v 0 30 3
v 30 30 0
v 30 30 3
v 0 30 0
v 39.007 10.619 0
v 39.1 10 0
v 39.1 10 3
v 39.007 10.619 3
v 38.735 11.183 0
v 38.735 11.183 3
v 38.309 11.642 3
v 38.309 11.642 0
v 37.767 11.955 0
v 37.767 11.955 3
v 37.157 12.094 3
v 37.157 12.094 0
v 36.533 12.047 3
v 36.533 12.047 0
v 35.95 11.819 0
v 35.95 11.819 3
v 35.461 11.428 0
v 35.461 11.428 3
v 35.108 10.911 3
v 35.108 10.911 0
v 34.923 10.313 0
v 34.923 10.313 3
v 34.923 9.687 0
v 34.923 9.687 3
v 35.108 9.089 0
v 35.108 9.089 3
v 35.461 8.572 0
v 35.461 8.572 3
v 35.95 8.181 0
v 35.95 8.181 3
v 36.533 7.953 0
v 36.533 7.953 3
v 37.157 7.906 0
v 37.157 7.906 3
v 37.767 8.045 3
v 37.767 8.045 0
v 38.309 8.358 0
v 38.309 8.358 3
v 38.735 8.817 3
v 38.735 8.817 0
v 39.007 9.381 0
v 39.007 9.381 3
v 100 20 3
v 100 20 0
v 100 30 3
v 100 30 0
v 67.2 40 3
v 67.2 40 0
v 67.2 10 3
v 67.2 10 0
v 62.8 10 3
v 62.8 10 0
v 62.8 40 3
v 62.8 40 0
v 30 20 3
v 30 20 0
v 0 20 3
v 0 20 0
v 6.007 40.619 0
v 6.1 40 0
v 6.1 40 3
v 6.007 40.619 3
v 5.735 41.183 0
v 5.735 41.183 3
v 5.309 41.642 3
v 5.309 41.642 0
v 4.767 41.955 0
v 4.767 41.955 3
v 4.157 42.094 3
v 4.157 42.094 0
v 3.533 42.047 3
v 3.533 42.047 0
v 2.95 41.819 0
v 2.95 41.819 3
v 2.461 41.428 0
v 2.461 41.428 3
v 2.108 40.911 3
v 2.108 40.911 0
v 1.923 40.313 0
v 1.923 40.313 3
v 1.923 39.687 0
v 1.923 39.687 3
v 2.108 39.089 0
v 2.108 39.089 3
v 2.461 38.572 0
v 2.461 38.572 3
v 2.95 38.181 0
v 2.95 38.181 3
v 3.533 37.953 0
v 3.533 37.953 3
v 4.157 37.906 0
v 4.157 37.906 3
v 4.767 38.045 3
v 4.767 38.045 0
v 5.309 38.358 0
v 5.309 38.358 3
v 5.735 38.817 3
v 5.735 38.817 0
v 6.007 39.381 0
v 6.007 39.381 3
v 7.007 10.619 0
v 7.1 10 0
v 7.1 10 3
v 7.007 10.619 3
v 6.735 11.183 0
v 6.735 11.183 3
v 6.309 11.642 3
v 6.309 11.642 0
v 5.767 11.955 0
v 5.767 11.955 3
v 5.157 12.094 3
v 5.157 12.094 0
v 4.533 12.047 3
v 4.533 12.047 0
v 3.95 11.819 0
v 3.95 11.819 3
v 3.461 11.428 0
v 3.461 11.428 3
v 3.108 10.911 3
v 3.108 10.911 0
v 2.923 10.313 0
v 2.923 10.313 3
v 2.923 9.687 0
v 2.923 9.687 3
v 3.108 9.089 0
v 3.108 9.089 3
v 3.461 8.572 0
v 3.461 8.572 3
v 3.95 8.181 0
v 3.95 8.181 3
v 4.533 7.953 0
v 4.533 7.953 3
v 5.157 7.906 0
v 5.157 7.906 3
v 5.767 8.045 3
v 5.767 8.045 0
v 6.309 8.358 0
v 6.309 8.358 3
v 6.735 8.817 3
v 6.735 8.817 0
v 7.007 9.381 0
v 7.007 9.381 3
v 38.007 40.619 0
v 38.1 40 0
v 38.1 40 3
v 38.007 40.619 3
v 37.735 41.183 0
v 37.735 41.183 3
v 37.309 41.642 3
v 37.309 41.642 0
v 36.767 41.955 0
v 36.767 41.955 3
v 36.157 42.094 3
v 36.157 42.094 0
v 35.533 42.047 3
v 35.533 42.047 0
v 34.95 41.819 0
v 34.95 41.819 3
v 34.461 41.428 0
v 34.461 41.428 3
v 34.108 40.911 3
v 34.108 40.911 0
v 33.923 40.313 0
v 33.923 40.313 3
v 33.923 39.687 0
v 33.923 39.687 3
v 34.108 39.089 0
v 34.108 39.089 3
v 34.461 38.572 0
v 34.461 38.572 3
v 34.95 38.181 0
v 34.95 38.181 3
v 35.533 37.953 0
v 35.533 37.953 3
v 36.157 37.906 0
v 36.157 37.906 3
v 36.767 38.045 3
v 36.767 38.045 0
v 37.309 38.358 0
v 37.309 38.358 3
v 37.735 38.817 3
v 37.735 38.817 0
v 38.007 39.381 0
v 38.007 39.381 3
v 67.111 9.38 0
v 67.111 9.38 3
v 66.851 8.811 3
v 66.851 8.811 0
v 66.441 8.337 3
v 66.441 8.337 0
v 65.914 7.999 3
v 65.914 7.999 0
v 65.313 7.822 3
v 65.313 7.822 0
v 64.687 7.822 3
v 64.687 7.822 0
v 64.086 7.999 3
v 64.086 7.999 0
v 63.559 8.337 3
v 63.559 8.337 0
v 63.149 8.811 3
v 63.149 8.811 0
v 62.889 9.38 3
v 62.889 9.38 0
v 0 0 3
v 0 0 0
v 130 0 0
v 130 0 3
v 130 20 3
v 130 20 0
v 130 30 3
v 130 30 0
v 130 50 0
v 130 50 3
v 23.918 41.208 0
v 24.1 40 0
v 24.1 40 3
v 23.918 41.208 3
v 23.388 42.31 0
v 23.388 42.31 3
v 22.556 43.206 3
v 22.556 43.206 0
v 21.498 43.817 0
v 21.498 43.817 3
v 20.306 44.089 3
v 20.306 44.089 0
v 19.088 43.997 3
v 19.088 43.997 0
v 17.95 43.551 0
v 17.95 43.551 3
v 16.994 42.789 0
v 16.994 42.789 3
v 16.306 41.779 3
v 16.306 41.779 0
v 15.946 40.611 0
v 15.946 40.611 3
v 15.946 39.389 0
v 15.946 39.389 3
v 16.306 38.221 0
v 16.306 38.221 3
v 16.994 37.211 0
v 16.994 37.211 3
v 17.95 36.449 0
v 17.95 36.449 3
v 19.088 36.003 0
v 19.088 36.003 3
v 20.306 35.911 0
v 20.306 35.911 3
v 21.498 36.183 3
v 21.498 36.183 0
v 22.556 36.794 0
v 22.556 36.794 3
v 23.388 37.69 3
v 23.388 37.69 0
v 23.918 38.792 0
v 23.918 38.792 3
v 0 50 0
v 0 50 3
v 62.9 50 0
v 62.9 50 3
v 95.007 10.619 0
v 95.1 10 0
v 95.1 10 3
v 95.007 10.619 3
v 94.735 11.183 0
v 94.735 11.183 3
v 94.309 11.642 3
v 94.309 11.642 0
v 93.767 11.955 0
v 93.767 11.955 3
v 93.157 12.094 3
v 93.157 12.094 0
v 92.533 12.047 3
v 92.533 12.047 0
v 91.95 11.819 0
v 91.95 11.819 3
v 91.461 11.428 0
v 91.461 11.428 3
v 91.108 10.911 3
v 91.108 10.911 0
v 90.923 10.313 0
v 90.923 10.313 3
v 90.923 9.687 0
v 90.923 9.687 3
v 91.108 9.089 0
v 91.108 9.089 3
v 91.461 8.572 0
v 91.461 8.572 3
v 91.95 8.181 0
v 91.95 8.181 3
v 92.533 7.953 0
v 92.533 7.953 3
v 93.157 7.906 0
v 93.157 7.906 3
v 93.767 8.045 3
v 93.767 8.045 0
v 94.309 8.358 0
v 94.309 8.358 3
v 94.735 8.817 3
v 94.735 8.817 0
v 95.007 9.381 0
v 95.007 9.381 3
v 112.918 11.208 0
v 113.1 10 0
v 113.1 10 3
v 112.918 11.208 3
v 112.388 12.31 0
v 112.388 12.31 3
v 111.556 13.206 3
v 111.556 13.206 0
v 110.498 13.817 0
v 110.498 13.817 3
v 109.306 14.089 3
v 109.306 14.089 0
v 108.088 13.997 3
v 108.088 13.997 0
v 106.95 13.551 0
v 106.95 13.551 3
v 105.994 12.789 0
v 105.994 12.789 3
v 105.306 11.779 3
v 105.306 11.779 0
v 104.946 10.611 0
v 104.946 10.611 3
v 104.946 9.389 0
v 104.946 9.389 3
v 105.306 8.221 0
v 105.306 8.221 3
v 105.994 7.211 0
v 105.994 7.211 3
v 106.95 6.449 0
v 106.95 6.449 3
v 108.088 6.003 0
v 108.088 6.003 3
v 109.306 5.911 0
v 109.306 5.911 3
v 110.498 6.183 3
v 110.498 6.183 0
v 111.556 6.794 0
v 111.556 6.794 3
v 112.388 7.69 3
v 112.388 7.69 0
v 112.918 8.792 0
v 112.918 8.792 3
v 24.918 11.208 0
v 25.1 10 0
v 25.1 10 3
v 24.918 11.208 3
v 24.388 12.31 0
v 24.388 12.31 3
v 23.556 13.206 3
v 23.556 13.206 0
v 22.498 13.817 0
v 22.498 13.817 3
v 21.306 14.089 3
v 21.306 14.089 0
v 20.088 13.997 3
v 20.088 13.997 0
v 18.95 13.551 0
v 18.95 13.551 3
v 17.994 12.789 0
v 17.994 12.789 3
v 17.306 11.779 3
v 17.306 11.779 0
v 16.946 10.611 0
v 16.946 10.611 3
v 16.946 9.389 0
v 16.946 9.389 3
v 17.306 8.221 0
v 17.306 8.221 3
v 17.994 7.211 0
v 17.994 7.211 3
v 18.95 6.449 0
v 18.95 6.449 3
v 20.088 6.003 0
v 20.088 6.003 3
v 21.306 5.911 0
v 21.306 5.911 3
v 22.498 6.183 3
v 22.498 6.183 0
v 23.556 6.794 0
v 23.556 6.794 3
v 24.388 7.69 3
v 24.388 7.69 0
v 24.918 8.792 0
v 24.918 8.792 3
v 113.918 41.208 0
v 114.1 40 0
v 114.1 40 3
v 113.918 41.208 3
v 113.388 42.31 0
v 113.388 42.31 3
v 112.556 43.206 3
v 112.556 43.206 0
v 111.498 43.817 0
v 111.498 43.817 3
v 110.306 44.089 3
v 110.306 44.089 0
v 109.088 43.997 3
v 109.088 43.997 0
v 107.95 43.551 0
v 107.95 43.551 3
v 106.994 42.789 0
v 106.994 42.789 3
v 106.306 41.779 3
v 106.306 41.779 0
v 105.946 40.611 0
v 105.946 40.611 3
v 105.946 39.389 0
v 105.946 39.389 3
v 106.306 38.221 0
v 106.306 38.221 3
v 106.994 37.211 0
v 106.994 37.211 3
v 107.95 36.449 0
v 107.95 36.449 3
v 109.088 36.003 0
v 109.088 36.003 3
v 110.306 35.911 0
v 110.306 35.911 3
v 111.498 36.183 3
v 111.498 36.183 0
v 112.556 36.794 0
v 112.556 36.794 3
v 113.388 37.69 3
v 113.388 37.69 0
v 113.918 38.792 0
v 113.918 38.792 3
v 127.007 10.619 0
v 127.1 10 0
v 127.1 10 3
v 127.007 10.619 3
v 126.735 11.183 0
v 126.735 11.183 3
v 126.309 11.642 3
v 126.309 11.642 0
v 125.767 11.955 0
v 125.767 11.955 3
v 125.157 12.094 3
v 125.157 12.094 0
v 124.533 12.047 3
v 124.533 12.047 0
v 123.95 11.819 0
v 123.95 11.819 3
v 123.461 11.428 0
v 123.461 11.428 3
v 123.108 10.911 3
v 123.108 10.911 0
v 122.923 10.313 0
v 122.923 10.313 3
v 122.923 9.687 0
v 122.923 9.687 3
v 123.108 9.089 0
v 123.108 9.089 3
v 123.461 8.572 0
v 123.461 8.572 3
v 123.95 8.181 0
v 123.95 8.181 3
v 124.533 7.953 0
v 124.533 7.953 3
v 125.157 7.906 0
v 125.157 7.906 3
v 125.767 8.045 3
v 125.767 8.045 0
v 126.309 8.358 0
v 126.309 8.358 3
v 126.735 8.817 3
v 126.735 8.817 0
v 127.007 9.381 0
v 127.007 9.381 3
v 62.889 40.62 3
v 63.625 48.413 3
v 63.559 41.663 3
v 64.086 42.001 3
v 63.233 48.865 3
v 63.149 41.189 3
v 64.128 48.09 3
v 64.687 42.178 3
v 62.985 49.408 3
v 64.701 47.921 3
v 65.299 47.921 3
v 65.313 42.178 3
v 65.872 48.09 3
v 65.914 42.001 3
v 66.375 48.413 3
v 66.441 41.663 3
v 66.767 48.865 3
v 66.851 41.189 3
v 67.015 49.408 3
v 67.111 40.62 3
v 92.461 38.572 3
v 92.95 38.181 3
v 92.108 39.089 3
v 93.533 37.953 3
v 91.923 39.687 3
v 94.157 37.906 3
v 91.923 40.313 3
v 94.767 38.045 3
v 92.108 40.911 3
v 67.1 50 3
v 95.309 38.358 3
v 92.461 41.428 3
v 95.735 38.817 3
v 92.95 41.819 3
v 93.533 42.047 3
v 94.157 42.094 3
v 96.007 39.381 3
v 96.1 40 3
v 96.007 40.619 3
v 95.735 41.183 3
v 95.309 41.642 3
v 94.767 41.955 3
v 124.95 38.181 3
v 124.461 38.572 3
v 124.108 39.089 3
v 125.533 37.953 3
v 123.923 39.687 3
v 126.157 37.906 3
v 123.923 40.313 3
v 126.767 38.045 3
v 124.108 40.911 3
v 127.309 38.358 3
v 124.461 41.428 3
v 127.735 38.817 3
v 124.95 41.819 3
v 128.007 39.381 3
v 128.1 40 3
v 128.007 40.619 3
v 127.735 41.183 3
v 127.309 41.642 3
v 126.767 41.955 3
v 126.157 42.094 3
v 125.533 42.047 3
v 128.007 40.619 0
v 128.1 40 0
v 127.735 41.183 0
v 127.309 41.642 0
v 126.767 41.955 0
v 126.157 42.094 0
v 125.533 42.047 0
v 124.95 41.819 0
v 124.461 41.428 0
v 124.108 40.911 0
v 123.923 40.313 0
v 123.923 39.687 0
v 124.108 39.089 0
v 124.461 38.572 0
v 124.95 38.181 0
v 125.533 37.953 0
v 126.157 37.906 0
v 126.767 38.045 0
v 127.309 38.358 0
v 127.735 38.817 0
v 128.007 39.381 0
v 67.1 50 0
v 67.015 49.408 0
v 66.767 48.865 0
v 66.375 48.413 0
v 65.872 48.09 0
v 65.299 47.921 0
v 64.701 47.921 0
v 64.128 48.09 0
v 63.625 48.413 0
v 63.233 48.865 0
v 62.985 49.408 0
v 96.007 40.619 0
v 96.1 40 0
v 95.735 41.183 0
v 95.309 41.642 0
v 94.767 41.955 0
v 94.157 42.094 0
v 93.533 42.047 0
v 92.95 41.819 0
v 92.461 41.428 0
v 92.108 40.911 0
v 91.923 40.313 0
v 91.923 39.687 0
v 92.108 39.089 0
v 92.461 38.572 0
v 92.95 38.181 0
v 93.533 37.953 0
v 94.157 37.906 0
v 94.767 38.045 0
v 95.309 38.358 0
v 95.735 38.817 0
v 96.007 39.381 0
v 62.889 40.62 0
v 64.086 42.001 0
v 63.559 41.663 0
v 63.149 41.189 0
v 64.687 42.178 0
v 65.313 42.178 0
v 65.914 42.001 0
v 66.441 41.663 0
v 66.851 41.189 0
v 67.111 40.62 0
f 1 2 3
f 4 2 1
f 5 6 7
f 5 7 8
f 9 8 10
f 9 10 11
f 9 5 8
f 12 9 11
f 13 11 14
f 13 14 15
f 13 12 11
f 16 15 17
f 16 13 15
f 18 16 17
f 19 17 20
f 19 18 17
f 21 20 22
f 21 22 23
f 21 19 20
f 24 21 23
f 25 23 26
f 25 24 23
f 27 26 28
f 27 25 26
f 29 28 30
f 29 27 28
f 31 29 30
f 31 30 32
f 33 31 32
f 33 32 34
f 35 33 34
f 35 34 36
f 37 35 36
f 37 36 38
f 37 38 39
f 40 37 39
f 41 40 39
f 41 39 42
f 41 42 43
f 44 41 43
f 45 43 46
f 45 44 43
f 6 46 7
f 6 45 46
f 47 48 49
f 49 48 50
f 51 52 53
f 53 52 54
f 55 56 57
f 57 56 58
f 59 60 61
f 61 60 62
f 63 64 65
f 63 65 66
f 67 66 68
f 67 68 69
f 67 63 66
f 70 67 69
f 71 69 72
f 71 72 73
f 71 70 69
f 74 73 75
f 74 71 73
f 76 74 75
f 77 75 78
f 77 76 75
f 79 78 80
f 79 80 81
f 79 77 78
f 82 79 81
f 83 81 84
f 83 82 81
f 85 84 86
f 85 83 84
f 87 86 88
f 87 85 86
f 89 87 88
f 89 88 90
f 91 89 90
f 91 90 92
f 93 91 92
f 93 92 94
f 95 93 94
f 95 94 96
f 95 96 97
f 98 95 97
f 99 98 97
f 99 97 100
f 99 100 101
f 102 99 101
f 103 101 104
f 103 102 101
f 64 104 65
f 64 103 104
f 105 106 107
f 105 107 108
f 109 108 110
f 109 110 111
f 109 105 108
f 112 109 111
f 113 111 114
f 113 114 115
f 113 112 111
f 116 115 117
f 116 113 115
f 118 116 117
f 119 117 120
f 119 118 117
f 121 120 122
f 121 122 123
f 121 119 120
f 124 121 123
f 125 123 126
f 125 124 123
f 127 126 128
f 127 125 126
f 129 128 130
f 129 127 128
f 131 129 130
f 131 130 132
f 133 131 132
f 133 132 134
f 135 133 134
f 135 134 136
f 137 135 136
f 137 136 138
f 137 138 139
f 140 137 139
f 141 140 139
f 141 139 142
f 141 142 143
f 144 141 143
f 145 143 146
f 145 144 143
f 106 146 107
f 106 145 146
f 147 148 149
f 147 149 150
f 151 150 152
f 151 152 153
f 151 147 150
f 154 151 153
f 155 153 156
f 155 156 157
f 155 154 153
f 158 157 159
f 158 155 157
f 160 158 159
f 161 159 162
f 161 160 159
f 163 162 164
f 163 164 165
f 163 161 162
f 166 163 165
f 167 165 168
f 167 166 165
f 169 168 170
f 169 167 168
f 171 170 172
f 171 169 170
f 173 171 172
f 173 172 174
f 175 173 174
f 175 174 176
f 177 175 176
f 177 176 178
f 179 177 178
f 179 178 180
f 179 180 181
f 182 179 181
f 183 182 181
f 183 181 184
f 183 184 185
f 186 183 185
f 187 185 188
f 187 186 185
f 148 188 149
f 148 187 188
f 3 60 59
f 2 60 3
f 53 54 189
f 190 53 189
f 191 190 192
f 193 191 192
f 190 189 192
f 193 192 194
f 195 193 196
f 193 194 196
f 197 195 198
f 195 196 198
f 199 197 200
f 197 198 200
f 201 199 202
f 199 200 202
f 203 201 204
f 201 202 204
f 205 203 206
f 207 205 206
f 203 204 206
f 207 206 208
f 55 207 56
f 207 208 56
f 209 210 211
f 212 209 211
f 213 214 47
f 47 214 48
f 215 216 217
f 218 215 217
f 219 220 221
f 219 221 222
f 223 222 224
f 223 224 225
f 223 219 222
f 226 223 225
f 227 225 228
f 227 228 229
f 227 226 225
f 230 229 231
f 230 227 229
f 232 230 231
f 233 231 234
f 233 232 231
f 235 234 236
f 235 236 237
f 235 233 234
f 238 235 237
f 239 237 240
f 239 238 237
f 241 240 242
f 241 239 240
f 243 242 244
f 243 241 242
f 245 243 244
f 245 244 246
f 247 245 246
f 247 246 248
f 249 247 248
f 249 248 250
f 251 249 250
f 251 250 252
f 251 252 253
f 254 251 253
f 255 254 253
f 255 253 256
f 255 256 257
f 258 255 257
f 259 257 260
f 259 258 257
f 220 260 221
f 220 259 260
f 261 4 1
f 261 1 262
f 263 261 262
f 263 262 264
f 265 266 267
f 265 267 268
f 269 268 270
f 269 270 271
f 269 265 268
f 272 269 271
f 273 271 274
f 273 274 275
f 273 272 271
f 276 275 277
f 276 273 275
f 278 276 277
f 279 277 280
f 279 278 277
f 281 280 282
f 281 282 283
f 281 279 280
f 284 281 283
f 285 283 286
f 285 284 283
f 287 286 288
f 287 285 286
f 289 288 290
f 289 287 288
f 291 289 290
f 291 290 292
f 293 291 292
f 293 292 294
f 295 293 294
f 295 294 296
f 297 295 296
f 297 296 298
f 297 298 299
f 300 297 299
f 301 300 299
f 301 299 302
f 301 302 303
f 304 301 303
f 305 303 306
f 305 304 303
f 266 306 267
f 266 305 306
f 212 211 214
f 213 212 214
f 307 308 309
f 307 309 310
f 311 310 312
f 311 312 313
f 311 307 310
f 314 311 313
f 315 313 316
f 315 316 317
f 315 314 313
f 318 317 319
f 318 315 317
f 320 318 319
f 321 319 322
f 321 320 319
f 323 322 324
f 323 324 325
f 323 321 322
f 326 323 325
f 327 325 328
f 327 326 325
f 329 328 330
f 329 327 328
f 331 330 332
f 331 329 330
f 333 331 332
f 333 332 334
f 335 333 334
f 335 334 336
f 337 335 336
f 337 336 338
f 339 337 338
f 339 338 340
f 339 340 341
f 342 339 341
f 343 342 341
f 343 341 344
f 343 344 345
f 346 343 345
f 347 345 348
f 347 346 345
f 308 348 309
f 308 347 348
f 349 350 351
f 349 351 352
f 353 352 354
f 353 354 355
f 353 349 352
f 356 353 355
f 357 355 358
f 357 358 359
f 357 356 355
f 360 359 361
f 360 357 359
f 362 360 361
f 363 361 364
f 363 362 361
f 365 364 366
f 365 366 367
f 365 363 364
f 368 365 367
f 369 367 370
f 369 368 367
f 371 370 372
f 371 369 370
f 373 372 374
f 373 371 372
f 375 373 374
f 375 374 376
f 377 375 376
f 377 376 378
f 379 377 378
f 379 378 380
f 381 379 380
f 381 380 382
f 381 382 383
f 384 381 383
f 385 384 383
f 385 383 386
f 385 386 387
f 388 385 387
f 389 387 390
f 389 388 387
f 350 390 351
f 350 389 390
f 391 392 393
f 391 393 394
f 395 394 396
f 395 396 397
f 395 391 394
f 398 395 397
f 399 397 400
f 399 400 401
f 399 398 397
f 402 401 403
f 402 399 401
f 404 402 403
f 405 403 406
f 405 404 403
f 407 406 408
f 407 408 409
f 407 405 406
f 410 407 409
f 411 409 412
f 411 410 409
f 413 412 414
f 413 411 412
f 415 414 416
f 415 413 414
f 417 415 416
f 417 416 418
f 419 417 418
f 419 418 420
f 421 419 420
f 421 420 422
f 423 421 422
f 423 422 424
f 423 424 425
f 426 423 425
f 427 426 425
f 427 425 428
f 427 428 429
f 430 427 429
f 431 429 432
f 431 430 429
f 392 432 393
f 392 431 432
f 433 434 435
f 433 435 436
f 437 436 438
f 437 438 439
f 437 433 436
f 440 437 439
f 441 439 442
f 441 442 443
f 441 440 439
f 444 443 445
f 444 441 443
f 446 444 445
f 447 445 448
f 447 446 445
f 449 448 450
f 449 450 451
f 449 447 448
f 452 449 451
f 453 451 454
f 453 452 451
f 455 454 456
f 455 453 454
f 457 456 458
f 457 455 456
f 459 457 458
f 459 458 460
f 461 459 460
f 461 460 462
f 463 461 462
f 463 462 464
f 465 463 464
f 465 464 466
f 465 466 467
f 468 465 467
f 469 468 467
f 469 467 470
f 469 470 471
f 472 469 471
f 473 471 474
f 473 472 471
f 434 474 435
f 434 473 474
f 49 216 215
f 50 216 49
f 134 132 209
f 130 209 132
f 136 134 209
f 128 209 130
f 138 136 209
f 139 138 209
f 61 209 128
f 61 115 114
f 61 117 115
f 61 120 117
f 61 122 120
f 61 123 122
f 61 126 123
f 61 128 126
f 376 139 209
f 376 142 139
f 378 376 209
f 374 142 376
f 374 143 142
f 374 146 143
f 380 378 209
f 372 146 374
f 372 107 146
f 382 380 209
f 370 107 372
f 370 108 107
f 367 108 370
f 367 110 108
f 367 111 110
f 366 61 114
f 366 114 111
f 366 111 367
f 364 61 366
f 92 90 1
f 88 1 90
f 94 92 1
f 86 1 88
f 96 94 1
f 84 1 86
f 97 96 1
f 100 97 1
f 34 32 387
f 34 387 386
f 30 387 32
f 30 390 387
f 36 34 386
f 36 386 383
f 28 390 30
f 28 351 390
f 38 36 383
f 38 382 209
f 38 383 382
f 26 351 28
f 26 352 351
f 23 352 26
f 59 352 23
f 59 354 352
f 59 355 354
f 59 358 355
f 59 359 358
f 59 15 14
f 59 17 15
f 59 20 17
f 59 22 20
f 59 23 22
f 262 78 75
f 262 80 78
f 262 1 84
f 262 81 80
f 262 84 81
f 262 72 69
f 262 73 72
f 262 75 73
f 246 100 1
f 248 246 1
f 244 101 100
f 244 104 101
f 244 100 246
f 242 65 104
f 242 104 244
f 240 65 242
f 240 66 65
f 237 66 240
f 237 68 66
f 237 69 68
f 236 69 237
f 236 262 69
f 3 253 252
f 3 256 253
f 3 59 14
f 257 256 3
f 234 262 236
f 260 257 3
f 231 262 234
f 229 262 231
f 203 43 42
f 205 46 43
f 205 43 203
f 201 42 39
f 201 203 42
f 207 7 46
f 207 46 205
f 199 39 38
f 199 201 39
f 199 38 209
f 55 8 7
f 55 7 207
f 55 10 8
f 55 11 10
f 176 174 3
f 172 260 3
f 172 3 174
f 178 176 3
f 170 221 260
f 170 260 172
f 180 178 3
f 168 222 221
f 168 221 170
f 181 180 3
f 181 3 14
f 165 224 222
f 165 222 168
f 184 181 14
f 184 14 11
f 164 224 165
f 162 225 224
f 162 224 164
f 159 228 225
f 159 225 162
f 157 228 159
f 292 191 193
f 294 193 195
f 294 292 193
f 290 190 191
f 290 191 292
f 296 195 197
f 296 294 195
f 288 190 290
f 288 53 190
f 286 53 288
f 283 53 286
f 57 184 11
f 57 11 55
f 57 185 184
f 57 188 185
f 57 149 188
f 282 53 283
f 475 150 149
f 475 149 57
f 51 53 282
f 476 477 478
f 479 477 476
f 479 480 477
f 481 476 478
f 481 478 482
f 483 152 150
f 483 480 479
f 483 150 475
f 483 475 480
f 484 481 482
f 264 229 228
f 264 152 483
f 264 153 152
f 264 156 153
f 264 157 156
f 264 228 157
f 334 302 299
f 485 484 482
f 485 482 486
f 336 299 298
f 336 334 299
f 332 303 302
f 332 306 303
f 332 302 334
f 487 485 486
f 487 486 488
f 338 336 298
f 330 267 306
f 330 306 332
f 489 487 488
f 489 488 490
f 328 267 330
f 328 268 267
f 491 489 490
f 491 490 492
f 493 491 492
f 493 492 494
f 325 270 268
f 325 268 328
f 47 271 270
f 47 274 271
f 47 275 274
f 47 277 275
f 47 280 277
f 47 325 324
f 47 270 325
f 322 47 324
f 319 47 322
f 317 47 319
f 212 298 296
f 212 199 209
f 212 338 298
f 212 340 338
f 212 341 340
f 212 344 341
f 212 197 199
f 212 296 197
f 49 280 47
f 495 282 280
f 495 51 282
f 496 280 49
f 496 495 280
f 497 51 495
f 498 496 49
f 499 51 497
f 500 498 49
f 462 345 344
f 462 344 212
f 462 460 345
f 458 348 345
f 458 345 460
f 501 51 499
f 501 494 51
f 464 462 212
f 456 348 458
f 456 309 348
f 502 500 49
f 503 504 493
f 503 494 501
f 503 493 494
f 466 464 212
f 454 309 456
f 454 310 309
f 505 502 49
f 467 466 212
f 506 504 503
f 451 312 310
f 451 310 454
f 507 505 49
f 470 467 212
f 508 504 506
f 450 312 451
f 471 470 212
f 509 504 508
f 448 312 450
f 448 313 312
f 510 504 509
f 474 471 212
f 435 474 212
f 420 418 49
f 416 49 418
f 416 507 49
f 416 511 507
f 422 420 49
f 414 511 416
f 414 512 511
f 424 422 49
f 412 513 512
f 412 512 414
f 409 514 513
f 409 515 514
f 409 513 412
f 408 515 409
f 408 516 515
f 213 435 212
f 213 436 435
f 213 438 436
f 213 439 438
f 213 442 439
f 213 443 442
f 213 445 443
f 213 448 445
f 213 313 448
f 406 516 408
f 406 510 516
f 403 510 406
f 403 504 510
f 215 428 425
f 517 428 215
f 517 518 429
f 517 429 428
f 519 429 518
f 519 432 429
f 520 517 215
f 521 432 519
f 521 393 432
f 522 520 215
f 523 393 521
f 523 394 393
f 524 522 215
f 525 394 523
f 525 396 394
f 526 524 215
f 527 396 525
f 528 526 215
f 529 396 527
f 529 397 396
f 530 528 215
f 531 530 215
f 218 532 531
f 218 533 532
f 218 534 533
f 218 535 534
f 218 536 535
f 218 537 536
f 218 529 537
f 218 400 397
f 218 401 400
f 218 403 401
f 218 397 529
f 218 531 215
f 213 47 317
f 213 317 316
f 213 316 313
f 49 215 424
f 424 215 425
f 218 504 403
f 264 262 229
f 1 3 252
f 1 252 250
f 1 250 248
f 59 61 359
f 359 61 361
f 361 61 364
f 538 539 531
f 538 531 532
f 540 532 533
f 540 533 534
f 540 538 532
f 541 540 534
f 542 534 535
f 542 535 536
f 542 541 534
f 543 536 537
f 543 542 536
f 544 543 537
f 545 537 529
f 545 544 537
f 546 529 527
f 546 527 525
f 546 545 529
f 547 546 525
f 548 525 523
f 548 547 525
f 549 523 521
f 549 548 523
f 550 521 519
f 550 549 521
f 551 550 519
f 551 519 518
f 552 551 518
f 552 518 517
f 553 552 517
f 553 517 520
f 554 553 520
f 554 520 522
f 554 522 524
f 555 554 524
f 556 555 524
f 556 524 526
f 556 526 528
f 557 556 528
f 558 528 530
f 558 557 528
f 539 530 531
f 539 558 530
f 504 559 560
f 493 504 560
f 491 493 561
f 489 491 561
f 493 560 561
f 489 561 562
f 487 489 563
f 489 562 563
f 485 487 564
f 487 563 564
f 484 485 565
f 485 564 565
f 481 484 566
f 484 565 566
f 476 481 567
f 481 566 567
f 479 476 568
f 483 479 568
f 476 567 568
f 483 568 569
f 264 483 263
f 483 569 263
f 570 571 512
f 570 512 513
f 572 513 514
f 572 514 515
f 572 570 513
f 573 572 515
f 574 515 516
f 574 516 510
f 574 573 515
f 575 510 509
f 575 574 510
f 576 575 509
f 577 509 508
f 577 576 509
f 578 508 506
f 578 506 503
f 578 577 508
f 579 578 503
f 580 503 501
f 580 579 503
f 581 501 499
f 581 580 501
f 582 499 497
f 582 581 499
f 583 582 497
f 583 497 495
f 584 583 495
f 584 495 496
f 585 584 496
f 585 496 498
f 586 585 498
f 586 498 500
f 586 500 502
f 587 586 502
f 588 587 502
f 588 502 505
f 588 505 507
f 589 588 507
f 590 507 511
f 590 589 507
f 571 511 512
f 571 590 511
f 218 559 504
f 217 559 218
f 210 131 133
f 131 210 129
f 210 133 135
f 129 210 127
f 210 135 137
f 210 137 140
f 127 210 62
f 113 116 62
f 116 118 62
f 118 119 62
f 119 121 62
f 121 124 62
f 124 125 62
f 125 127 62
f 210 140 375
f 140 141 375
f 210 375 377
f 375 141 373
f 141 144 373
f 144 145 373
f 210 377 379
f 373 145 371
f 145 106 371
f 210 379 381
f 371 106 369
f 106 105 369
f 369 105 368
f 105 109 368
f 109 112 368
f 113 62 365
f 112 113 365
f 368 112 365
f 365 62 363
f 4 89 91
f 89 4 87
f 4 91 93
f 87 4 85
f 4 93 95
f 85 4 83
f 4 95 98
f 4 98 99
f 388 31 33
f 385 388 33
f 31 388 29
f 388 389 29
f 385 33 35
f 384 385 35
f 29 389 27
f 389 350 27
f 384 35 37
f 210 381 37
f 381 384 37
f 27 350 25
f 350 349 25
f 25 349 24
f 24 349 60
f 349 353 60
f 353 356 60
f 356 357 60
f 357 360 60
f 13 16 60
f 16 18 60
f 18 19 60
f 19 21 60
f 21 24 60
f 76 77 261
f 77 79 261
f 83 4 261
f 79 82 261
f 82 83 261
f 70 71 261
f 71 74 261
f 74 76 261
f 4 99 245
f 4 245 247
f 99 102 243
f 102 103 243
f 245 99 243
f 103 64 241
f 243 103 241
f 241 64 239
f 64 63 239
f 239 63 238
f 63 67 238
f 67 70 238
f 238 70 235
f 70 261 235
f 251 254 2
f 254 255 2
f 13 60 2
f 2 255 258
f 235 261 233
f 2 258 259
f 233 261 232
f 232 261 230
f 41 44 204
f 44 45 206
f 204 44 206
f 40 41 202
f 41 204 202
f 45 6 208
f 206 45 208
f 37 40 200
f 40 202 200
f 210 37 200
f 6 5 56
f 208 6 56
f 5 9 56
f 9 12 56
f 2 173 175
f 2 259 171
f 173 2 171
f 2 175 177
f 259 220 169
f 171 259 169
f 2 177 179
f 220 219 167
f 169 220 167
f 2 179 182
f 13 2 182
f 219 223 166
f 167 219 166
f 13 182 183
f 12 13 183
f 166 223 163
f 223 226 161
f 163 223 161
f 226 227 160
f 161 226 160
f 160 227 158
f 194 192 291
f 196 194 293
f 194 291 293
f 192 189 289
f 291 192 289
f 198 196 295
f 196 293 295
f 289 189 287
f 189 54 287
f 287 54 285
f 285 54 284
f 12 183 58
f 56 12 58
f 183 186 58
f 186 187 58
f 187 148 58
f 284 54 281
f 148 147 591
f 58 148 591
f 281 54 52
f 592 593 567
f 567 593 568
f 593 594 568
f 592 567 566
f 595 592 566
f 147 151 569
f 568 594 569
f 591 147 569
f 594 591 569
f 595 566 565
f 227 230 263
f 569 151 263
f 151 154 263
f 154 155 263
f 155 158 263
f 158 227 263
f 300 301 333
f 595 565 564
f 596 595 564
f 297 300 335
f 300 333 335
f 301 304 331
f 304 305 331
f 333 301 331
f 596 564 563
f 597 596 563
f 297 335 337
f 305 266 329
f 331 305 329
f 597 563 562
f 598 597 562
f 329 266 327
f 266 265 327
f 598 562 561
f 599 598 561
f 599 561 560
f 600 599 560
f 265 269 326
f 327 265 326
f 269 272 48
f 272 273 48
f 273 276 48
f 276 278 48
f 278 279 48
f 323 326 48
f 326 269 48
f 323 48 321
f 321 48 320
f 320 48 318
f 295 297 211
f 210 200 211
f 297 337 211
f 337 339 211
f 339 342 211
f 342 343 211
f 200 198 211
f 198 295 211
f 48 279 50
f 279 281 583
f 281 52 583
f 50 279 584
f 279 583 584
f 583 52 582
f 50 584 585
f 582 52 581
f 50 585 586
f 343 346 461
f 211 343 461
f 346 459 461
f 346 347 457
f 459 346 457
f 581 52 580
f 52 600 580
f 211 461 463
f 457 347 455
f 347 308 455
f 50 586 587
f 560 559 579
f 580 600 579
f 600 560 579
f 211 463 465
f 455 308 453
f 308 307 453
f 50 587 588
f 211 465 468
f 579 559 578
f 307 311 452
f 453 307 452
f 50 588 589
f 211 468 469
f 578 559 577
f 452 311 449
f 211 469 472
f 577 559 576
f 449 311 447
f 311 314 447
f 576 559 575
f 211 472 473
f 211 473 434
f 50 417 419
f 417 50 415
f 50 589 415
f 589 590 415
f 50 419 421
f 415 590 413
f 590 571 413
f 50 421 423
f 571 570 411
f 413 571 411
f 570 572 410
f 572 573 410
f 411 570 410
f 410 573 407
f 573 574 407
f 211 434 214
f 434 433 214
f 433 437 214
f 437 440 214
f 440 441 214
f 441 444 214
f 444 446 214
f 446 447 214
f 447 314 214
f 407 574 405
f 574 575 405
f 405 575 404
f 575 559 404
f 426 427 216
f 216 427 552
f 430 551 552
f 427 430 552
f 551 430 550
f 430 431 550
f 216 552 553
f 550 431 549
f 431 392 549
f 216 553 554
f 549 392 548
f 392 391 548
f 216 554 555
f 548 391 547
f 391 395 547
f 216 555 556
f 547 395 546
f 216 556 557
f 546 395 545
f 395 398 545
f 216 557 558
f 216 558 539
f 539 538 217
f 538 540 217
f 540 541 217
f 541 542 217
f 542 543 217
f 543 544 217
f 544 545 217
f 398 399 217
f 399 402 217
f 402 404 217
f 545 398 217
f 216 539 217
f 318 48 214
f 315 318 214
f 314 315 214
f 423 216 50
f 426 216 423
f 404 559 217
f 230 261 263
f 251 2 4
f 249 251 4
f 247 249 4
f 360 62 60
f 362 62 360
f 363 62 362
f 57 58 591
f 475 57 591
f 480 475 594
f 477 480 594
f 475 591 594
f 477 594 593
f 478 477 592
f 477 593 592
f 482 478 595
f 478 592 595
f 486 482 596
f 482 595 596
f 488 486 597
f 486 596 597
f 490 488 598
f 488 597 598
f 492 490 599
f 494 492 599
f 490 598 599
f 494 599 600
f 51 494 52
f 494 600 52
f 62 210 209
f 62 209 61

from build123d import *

# Parameters (mm, degrees)
ESQUISSE1_W             = 130
ESQUISSE1_H             = 50
ESQUISSE1_R             = 2.1
ESQUISSE1_R_2           = 4.1
BOSS_EXTRU_1_DEPTH      = 3
ENL_V_MAT_EXTRU_1_REACH = 5
ESQUISSE2_W             = 30
ESQUISSE2_H             = 10


with BuildPart() as part:
    # Esquisse1 → Boss.-Extru.1 (new body)
    with BuildSketch(Plane.XY):
        with Locations((65, 25)):
            Rectangle(ESQUISSE1_W, ESQUISSE1_H)
        with Locations((4, 40)):
            Circle(ESQUISSE1_R, mode=Mode.SUBTRACT)
        with Locations((20, 40)):
            Circle(ESQUISSE1_R_2, mode=Mode.SUBTRACT)
        with Locations((36, 40)):
            Circle(ESQUISSE1_R, mode=Mode.SUBTRACT)
        with Locations((94, 40)):
            Circle(ESQUISSE1_R, mode=Mode.SUBTRACT)
        with Locations((110, 40)):
            Circle(ESQUISSE1_R_2, mode=Mode.SUBTRACT)
        with Locations((126, 40)):
            Circle(ESQUISSE1_R, mode=Mode.SUBTRACT)
        with Locations((5, 10)):
            Circle(ESQUISSE1_R, mode=Mode.SUBTRACT)
        with Locations((21, 10)):
            Circle(ESQUISSE1_R_2, mode=Mode.SUBTRACT)
        with Locations((37, 10)):
            Circle(ESQUISSE1_R, mode=Mode.SUBTRACT)
        with Locations((93, 10)):
            Circle(ESQUISSE1_R, mode=Mode.SUBTRACT)
        with Locations((109, 10)):
            Circle(ESQUISSE1_R_2, mode=Mode.SUBTRACT)
        with Locations((125, 10)):
            Circle(ESQUISSE1_R, mode=Mode.SUBTRACT)
        with BuildLine():
            Line((62.8, 10), (62.8, 40))
            ThreePointArc((62.8, 40), (65, 42.2), (67.2, 40))
            Line((67.2, 40), (67.2, 10))
            ThreePointArc((67.2, 10), (65, 7.8), (62.8, 10))
        make_face(mode=Mode.SUBTRACT)
    extrude(amount=BOSS_EXTRU_1_DEPTH)

    # Esquisse2 → Enlèv. mat.-Extru.1 (cut, up to next)
    with BuildSketch(Plane(origin=(0, 0, 0), x_dir=(-1, 0, 0), z_dir=(0, 0, -1)), mode=Mode.PRIVATE) as enl_v_mat_extru_1_sk1:
        with Locations((-15, 25)):
            Rectangle(ESQUISSE2_W, ESQUISSE2_H)
    enl_v_mat_extru_1_tool1 = extrude(enl_v_mat_extru_1_sk1.sketch, amount=-ENL_V_MAT_EXTRU_1_REACH, mode=Mode.PRIVATE) & part.part
    add(enl_v_mat_extru_1_tool1.solids().sort_by_distance((15, 25, 0))[0], mode=Mode.SUBTRACT)
    # Esquisse2 → Enlèv. mat.-Extru.1 (cut, up to next)
    with BuildSketch(Plane(origin=(0, 0, 0), x_dir=(-1, 0, 0), z_dir=(0, 0, -1)), mode=Mode.PRIVATE) as enl_v_mat_extru_1_sk2:
        with Locations((-115, 25)):
            Rectangle(ESQUISSE2_W, ESQUISSE2_H)
    enl_v_mat_extru_1_tool2 = extrude(enl_v_mat_extru_1_sk2.sketch, amount=-ENL_V_MAT_EXTRU_1_REACH, mode=Mode.PRIVATE) & part.part
    add(enl_v_mat_extru_1_tool2.solids().sort_by_distance((115, 25, 0))[0], mode=Mode.SUBTRACT)
    # Esquisse2 → Enlèv. mat.-Extru.1 (cut, up to next)
    with BuildSketch(Plane(origin=(0, 0, 0), x_dir=(-1, 0, 0), z_dir=(0, 0, -1)), mode=Mode.PRIVATE) as enl_v_mat_extru_1_sk3:
        with BuildLine():
            Line((-62.9, 50), (-67.1, 50))
            ThreePointArc((-67.1, 50), (-65, 47.9), (-62.9, 50))
        make_face()
    enl_v_mat_extru_1_tool3 = extrude(enl_v_mat_extru_1_sk3.sketch, amount=-ENL_V_MAT_EXTRU_1_REACH, mode=Mode.PRIVATE) & part.part
    add(enl_v_mat_extru_1_tool3.solids().sort_by_distance((65, 49.108732, 0))[0], mode=Mode.SUBTRACT)


solid = part.part
